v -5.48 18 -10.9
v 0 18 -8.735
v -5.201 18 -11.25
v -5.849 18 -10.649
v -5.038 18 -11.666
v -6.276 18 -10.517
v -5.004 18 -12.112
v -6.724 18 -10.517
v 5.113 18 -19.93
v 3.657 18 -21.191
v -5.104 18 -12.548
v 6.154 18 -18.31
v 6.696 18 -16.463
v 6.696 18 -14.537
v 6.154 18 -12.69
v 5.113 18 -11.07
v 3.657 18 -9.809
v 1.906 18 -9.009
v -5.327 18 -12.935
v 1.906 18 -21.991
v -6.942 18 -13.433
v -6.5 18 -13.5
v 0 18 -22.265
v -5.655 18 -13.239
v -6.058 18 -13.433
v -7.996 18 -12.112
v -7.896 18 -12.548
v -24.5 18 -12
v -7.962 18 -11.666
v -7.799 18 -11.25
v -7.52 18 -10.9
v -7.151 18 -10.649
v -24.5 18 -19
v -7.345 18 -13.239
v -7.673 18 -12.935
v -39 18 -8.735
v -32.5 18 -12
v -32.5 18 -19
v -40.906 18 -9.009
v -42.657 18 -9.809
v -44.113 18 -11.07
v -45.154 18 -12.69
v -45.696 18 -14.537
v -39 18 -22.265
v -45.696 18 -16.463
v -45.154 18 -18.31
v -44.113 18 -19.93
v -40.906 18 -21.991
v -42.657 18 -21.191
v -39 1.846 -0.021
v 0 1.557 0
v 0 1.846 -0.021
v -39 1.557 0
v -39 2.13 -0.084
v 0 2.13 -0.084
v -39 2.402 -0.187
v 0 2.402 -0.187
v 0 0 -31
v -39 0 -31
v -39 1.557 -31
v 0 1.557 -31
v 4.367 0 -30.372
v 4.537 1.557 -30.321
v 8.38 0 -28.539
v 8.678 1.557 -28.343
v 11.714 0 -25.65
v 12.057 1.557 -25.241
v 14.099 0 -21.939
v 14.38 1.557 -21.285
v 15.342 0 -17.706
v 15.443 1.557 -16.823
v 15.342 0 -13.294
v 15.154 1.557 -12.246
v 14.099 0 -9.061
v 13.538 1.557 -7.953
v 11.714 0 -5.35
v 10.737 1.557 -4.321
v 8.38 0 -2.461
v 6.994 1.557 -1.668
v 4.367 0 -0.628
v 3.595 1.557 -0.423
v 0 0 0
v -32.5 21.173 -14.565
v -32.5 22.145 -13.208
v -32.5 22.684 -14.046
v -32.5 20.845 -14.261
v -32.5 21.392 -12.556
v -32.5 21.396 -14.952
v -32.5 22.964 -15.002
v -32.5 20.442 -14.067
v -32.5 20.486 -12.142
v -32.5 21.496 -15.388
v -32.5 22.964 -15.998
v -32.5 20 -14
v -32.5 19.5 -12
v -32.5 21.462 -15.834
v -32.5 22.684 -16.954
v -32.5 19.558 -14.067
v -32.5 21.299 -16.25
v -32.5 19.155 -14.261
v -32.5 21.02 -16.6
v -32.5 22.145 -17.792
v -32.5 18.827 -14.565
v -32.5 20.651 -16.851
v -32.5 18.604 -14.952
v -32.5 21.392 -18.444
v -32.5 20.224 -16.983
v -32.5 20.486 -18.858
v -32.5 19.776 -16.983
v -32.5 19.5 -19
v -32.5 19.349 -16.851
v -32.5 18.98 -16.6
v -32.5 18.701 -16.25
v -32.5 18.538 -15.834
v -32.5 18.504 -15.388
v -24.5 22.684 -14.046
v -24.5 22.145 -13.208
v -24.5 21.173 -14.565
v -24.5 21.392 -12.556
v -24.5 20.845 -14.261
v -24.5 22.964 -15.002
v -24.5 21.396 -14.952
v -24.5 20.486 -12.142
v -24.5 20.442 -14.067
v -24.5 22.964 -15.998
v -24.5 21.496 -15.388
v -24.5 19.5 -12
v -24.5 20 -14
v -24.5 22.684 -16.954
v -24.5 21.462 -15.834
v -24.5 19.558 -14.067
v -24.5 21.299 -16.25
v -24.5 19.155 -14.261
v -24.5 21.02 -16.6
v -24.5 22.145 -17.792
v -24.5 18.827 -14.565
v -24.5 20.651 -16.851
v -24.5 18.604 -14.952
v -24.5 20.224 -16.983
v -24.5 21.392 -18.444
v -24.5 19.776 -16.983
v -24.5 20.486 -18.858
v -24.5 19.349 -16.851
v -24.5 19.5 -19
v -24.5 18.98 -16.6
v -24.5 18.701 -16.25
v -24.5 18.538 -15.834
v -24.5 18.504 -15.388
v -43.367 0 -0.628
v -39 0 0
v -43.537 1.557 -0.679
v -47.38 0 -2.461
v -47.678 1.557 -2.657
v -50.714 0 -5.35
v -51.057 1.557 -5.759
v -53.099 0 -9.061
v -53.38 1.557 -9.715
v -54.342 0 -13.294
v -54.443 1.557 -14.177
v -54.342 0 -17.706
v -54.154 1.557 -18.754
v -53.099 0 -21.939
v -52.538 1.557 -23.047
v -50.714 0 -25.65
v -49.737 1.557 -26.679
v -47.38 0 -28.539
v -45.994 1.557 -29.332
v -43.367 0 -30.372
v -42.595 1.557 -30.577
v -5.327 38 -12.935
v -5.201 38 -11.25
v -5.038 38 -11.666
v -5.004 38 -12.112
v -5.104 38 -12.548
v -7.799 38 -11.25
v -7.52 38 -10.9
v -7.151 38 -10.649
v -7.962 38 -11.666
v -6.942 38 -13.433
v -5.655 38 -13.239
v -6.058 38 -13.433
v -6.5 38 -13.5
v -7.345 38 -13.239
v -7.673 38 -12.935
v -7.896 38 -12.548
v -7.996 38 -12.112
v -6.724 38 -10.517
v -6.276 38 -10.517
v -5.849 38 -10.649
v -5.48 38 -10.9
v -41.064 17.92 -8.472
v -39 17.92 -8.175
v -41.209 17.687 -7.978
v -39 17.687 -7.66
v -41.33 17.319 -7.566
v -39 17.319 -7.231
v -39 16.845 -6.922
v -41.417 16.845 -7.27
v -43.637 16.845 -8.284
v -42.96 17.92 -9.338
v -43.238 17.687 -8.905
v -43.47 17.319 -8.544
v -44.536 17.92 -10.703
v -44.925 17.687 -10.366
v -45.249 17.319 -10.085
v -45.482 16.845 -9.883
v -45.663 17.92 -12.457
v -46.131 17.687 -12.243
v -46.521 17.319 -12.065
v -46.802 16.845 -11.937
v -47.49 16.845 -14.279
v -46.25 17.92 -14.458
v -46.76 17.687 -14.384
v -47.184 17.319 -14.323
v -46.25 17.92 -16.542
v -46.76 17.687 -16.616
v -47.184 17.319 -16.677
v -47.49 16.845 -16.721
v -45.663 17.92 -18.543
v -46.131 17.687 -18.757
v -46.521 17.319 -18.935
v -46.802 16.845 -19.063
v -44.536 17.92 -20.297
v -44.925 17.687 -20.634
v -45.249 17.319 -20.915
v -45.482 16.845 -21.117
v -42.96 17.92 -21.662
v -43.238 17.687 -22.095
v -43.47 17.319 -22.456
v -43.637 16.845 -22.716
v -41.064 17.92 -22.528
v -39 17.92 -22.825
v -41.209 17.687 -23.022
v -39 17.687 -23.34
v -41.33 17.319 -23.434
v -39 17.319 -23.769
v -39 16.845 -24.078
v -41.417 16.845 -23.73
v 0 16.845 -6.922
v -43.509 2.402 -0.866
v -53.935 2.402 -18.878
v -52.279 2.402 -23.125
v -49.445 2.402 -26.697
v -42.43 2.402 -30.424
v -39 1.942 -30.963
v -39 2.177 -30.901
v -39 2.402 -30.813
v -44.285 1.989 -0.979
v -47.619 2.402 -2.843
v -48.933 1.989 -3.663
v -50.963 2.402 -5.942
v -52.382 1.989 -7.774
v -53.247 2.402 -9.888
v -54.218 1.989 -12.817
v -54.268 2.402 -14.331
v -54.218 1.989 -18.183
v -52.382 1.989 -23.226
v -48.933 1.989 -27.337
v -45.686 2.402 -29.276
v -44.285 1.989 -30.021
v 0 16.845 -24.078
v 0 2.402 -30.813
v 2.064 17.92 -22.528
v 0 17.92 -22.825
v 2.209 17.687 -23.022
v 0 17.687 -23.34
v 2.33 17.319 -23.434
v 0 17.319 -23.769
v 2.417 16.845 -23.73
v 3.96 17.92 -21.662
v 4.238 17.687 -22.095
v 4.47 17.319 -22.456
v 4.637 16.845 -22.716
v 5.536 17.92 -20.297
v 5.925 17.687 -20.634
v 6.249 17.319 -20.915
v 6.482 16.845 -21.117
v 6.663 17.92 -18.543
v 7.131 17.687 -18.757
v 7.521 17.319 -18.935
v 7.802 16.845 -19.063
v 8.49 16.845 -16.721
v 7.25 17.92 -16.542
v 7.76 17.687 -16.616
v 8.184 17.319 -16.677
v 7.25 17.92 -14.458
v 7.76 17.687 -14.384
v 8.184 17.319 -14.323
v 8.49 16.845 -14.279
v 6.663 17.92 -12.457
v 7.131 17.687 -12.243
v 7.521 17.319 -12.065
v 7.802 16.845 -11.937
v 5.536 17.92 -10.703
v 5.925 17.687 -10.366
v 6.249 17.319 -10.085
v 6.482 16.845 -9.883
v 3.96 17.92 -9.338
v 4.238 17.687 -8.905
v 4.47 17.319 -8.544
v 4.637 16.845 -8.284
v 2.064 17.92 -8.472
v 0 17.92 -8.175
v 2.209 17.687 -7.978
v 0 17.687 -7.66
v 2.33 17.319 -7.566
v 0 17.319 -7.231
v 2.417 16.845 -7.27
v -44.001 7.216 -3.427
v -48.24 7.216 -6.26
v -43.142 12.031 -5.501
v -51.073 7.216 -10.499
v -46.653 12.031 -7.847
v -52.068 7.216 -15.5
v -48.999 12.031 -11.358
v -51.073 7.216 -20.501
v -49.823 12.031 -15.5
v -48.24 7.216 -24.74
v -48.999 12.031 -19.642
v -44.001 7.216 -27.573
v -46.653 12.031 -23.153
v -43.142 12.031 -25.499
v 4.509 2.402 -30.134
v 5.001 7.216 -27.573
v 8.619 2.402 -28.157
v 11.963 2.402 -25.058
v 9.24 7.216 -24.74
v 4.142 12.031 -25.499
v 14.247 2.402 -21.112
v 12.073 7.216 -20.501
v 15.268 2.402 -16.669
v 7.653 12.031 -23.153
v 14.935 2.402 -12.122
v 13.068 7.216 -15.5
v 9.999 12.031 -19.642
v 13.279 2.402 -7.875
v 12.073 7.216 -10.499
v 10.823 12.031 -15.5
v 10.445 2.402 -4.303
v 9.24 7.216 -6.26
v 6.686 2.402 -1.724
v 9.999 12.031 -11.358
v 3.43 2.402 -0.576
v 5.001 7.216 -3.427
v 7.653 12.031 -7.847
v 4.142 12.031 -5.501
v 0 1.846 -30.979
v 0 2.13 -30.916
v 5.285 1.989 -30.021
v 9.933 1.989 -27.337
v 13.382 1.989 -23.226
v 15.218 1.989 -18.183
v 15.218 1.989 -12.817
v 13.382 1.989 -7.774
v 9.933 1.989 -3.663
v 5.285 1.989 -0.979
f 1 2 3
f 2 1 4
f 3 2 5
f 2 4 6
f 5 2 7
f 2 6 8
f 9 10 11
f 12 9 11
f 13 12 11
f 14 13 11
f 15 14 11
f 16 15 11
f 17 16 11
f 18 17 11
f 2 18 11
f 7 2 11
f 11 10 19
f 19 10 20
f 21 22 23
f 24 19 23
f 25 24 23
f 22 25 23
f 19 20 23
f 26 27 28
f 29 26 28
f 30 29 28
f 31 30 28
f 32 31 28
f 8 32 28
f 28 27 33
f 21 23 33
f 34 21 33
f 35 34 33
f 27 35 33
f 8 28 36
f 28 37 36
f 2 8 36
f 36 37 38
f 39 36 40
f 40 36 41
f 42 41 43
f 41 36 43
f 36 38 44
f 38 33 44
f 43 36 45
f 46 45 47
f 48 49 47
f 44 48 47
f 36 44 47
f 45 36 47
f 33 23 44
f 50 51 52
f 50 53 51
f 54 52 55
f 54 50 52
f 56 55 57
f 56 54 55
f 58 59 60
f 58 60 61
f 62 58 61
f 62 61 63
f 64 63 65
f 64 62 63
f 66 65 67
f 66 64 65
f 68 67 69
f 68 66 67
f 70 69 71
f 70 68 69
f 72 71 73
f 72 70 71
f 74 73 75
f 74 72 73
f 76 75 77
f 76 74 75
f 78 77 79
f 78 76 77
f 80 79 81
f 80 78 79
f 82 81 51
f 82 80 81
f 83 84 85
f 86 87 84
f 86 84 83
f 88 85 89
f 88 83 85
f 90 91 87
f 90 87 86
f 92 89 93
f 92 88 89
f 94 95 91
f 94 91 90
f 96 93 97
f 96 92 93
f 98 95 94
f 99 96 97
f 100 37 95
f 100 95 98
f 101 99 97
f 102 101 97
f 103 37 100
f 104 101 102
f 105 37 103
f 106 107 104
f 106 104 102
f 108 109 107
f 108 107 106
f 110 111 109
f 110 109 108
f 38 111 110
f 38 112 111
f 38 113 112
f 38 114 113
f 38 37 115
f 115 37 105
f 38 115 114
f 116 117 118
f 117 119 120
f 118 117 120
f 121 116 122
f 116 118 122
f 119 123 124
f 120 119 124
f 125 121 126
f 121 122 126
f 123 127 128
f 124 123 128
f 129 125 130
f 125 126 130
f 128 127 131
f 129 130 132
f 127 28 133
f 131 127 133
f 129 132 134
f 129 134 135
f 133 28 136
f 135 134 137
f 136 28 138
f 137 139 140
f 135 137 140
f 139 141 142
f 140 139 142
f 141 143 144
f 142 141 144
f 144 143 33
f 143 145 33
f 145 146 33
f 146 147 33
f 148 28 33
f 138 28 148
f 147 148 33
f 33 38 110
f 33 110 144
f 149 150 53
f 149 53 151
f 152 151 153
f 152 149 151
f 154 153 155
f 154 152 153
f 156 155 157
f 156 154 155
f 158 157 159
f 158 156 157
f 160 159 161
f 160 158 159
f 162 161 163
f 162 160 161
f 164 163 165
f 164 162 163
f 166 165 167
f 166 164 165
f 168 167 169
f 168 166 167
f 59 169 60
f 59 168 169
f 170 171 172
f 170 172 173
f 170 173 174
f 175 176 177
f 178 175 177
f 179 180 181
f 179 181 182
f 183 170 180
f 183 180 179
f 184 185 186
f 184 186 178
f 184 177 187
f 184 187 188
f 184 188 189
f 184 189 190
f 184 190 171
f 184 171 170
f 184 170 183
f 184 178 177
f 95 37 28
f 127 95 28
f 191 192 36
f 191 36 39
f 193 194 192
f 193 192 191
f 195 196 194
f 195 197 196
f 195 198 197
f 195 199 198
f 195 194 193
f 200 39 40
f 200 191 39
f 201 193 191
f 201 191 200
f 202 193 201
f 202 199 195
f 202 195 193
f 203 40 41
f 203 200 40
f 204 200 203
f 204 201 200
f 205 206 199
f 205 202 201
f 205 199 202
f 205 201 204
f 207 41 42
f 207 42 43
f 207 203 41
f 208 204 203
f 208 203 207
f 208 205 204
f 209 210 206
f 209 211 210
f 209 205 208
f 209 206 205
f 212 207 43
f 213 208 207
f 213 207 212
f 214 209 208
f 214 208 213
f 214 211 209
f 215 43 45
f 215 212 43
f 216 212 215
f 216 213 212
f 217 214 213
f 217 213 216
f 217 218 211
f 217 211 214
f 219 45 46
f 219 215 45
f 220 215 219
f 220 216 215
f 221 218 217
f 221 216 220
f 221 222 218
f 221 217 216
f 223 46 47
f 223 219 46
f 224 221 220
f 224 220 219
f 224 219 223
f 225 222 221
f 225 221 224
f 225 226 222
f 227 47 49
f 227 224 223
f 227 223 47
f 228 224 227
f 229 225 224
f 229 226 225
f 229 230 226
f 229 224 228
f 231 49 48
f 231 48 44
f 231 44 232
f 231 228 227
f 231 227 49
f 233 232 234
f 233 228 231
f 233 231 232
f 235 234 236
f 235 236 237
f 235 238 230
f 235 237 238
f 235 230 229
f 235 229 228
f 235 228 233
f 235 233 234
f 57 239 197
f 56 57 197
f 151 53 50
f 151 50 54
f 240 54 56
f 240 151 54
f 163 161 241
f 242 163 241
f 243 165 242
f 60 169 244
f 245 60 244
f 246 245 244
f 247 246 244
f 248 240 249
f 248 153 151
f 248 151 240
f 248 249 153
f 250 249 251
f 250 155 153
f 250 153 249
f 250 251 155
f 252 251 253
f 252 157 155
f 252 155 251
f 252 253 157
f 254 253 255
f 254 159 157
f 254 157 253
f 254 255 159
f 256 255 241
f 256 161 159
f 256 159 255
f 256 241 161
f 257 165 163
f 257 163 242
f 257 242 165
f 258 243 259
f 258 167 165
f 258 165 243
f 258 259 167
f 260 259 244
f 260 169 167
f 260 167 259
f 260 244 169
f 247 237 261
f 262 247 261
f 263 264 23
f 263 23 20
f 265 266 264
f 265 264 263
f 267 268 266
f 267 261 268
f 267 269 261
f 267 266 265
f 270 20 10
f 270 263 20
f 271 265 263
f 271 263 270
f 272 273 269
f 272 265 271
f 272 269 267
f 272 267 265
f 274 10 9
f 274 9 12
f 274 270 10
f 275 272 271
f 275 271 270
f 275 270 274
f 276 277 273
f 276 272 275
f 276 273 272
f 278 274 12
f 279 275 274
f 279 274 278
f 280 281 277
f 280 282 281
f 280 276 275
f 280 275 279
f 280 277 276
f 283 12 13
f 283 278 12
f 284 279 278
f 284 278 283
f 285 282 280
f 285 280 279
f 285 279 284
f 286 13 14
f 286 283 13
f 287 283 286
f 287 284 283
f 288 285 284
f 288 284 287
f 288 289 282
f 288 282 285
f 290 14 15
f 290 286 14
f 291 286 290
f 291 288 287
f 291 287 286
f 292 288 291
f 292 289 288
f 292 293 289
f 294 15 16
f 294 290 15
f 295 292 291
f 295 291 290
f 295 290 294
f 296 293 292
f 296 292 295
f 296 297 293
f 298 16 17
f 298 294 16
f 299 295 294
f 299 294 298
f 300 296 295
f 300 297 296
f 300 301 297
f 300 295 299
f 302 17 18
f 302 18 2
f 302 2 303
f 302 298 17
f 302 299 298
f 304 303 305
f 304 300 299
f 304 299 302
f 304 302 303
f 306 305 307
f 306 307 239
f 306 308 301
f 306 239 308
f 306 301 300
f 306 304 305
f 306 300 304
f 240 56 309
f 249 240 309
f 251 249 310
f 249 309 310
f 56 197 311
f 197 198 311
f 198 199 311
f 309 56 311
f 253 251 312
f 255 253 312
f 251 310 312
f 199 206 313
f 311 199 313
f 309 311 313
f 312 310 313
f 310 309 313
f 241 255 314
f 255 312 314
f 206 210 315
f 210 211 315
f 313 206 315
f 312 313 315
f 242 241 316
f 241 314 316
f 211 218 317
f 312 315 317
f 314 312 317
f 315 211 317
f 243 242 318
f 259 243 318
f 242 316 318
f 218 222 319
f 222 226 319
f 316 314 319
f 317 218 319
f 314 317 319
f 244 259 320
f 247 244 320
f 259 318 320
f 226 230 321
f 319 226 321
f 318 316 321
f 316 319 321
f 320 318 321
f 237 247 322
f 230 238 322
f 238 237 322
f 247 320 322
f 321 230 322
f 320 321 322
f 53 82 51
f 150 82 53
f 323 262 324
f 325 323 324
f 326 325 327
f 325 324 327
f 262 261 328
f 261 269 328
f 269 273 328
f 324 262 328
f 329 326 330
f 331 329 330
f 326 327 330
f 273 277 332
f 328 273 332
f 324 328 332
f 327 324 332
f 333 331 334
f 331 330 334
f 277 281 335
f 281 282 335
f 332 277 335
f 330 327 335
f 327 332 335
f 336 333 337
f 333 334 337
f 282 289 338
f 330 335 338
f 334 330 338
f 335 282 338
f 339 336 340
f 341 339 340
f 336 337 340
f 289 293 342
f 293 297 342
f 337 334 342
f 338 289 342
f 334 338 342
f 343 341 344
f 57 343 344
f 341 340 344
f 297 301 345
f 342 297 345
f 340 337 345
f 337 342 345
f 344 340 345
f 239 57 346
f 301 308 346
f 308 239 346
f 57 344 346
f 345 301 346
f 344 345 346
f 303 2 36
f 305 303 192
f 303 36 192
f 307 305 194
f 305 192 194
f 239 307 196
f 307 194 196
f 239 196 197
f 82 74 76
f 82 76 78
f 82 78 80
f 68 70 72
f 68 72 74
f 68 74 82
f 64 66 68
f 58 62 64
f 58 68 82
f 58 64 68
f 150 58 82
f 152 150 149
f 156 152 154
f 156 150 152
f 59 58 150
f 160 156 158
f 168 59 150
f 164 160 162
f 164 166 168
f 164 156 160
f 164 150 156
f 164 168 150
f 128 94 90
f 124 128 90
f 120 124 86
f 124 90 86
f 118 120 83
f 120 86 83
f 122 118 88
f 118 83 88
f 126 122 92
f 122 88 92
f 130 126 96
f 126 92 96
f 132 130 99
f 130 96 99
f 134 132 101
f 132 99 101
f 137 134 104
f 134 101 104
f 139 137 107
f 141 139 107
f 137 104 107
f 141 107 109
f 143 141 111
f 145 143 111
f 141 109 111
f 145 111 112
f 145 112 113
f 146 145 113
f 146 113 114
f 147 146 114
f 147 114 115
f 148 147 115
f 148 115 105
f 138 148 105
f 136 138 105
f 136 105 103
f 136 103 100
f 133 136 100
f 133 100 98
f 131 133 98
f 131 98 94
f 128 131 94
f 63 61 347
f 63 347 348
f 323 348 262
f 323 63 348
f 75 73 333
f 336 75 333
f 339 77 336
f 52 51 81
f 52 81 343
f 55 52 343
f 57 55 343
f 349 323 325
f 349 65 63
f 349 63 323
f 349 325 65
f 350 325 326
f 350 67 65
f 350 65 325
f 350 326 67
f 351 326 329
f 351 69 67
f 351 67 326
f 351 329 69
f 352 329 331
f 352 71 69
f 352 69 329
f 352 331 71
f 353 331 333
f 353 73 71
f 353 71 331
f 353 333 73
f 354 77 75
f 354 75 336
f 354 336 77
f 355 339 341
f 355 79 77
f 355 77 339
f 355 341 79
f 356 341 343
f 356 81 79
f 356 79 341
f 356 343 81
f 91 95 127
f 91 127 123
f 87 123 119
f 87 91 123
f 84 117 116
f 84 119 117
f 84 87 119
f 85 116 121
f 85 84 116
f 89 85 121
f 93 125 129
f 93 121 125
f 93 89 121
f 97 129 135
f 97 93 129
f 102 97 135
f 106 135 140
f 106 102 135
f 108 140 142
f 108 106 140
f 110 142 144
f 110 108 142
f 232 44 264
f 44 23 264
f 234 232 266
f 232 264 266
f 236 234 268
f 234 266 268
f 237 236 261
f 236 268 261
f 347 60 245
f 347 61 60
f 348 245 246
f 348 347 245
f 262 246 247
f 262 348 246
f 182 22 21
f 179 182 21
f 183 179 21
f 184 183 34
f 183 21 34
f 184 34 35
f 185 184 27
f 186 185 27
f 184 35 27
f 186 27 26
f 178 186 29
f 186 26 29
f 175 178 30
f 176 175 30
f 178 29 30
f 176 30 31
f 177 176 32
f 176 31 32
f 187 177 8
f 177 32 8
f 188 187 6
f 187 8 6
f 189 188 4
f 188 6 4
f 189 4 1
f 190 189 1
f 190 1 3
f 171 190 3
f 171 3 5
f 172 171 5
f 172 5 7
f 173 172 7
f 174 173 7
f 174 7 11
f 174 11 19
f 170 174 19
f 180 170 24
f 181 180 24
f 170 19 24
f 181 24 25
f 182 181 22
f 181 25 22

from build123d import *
from OCP.BRepFilletAPI import BRepFilletAPI_MakeChamfer

# Parameters (mm, degrees)
BOSS_EXTRUDE1_DEPTH = 18
SKETCH2_R           = 1.5
BOSS_EXTRUDE2_DEPTH = 20
SKETCH3_W           = 8
SKETCH3_H           = 7
BOSS_EXTRUDE3_DEPTH = 5
SKETCH4_R           = 1.5
CUT_EXTRUDE1_DEPTH  = 10
CHAMFER1_SIZE       = 16
CHAMFER1_SIZE2      = 7.46092253
FILLET3_R           = 2


with BuildPart() as part:
    # Sketch1 → Boss-Extrude1 (new body)
    with BuildSketch(Plane(origin=(0, 0, 0), x_dir=(1, 0, 0), z_dir=(0, 1, 0))):
        with BuildLine():
            Line((0, 0), (-39, 0))
            ThreePointArc((-39, 0), (-54.5, 15.5), (-39, 31))
            Line((-39, 31), (0, 31))
            ThreePointArc((0, 31), (15.5, 15.5), (0, 0))
        make_face()
    extrude(amount=BOSS_EXTRUDE1_DEPTH)

    # Sketch2 → Boss-Extrude2 (add)
    with BuildSketch(Plane(origin=(0, 18, 0), x_dir=(1, 0, 0), z_dir=(0, 1, 0))):
        with Locations(Location((-6.5, 12, 0), (0, 0, 90))):
            Circle(SKETCH2_R)
    extrude(amount=BOSS_EXTRUDE2_DEPTH)

    # Sketch3 → Boss-Extrude3 (add)
    with BuildSketch(Plane(origin=(0, 18, 0), x_dir=(1, 0, 0), z_dir=(0, 1, 0))):
        with Locations((-28.5, 15.5)):
            Rectangle(SKETCH3_W, SKETCH3_H)
    extrude(amount=BOSS_EXTRUDE3_DEPTH)

    # Sketch4 → Cut-Extrude1 (cut)
    with BuildSketch(Plane.ZY.offset(32.5)):
        with Locations((-15.5, 20)):
            Circle(SKETCH4_R)
        with BuildLine():
            Line((-19, 19.5), (-19, 26.550877956))
            Line((-19, 26.550877956), (-12, 26.550877956))
            Line((-12, 26.550877956), (-12, 19.5))
            ThreePointArc((-12, 19.5), (-15.5, 23), (-19, 19.5))
        make_face()
    extrude(amount=-CUT_EXTRUDE1_DEPTH, mode=Mode.SUBTRACT)

    # Chamfer1: one chamfer whose edges measure the first distance from different faces: ONE call of the kernel's chamfer builder (chamfer() names one face for all edges)
    chamfer1_edges_1 = [part.edges().sort_by_distance(p)[0] for p in [
        (-54.5, 18, -15.5),
    ]]
    chamfer1_side_1 = [part.faces().sort_by_distance(p)[0] for p in [
        (-54.5, 9, -15.5),
    ]]
    chamfer1_edges_2 = [part.edges().sort_by_distance(p)[0] for p in [
        (-19.5, 18, 0),
    ]]
    chamfer1_side_2 = [part.faces().sort_by_distance(p)[0] for p in [
        (-19.5, 9, 0),
    ]]
    chamfer1_edges_3 = [part.edges().sort_by_distance(p)[0] for p in [
        (15.5, 18, -15.5),
    ]]
    chamfer1_side_3 = [part.faces().sort_by_distance(p)[0] for p in [
        (15.5, 9, -15.5),
    ]]
    chamfer1_edges_4 = [part.edges().sort_by_distance(p)[0] for p in [
        (-19.5, 18, -31),
    ]]
    chamfer1_side_4 = [part.faces().sort_by_distance(p)[0] for p in [
        (-19.5, 9, -31),
    ]]
    chamfer1 = BRepFilletAPI_MakeChamfer(part.part.solid().wrapped)
    for e in chamfer1_edges_1:
        chamfer1.Add(CHAMFER1_SIZE, CHAMFER1_SIZE2, e.wrapped, chamfer1_side_1[0].wrapped)  # the first distance lies on this face
    for e in chamfer1_edges_2:
        chamfer1.Add(CHAMFER1_SIZE, CHAMFER1_SIZE2, e.wrapped, chamfer1_side_2[0].wrapped)  # the first distance lies on this face
    for e in chamfer1_edges_3:
        chamfer1.Add(CHAMFER1_SIZE, CHAMFER1_SIZE2, e.wrapped, chamfer1_side_3[0].wrapped)  # the first distance lies on this face
    for e in chamfer1_edges_4:
        chamfer1.Add(CHAMFER1_SIZE, CHAMFER1_SIZE2, e.wrapped, chamfer1_side_4[0].wrapped)  # the first distance lies on this face
    add(Compound.cast(chamfer1.Shape()), mode=Mode.REPLACE)

    # Fillet3
    fillet3_edges = [part.edges().sort_by_distance(p)[0] for p in [
        (-19.5, 18, -23.53907747),
        (-47.03907747, 18, -15.5),
        (8.03907747, 18, -15.5),
        (-19.5, 18, -7.46092253),
        (-19.5, 2, 0),
        (15.5, 2, -15.5),
        (-54.5, 2, -15.5),
        (-19.5, 2, -31),
    ]]
    fillet(fillet3_edges, radius=FILLET3_R)


solid = part.part
